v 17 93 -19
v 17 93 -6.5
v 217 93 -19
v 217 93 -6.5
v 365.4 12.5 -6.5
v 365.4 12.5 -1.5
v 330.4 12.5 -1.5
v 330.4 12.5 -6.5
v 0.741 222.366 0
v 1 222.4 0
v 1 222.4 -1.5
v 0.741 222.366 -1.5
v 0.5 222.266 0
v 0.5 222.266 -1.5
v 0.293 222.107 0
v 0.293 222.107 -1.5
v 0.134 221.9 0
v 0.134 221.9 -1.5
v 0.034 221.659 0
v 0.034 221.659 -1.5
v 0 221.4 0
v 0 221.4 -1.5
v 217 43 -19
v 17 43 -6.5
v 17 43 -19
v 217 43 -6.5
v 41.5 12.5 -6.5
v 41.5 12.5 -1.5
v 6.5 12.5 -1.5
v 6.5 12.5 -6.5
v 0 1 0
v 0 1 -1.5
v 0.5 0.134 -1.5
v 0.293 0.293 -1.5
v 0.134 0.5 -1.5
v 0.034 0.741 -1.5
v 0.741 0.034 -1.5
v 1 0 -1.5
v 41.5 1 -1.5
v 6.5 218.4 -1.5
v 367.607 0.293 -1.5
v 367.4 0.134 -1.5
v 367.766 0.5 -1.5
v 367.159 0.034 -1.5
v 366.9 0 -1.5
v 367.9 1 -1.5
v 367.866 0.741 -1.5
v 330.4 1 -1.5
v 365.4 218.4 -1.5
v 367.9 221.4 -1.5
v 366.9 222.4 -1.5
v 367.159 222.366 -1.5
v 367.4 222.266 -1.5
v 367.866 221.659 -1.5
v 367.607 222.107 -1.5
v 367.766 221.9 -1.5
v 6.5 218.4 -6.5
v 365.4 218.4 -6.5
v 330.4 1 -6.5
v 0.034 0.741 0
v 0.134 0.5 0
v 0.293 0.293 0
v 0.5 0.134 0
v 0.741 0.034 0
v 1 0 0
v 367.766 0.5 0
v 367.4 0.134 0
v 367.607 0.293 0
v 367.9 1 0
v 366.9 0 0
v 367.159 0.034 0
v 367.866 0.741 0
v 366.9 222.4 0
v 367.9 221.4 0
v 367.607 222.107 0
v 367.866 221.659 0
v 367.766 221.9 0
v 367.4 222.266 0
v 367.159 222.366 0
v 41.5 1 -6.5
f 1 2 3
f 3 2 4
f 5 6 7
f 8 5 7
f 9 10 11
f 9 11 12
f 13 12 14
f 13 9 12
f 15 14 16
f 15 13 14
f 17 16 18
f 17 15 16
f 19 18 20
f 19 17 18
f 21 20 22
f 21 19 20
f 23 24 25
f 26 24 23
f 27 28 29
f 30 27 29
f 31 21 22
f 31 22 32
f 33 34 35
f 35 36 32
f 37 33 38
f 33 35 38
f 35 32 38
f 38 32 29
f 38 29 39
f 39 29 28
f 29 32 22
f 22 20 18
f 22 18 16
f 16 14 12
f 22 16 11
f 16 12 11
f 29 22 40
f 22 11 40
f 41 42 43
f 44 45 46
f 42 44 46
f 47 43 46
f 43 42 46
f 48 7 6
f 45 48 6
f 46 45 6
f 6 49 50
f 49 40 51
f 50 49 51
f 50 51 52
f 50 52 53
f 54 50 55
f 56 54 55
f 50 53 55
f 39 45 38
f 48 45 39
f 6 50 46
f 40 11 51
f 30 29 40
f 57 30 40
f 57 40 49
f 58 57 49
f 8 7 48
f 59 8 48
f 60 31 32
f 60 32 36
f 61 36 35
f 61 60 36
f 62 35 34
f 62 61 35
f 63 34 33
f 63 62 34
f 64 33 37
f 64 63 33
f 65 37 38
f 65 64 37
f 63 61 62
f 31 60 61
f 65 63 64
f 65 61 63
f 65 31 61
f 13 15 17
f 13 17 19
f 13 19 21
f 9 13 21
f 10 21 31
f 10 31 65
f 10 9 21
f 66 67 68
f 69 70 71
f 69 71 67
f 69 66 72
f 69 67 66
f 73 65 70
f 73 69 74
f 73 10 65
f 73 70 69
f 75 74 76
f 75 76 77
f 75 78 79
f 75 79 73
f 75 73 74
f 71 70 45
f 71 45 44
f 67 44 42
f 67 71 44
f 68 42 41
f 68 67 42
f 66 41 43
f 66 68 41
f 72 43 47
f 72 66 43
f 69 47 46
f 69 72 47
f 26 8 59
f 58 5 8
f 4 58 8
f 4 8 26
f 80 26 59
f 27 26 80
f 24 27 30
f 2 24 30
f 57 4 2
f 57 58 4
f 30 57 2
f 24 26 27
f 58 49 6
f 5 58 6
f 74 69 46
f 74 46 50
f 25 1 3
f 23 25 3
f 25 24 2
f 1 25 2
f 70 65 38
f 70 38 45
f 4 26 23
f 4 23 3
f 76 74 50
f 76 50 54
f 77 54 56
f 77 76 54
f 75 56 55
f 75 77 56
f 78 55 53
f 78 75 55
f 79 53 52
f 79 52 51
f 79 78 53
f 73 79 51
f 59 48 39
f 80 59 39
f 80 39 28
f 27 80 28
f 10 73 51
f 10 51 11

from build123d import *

# Parameters (mm, degrees)
PAD002_DEPTH = 1.5
PAD003_DEPTH = 6.5
SKETCH005_W  = 200
SKETCH005_H  = 50
PAD005_DEPTH = 19


with BuildPart() as part:
    # Sketch002 → Pad002 (new body)
    with BuildSketch(Plane.XY):
        with BuildLine():
            Line((1, 0), (366.9, 0))
            ThreePointArc((366.9, 0), (367.607107, 0.292893), (367.9, 1))
            Line((367.9, 1), (367.9, 221.4))
            ThreePointArc((367.9, 221.4), (367.607107, 222.107107), (366.9, 222.4))
            Line((366.9, 222.4), (1, 222.4))
            ThreePointArc((1, 222.4), (0.292893, 222.107107), (0, 221.4))
            Line((0, 221.4), (0, 1))
            ThreePointArc((0, 1), (0.292893, 0.292893), (1, 0))
        make_face()
    extrude(amount=-PAD002_DEPTH)

    # Sketch003 → Pad003 (join)
    with BuildSketch(Plane.XY):
        Polygon((6.5, 12.5), (6.5, 218.4), (365.4, 218.4), (365.4, 12.5), (330.4, 12.5), (330.4, 1), (41.5, 1), (41.5, 12.5), align=None)
    extrude(amount=-PAD003_DEPTH)

    # Sketch005 → Pad005 (join)
    with BuildSketch(Plane.XY):
        with Locations((117, 68)):
            Rectangle(SKETCH005_W, SKETCH005_H)
    extrude(amount=-PAD005_DEPTH)


solid = part.part
